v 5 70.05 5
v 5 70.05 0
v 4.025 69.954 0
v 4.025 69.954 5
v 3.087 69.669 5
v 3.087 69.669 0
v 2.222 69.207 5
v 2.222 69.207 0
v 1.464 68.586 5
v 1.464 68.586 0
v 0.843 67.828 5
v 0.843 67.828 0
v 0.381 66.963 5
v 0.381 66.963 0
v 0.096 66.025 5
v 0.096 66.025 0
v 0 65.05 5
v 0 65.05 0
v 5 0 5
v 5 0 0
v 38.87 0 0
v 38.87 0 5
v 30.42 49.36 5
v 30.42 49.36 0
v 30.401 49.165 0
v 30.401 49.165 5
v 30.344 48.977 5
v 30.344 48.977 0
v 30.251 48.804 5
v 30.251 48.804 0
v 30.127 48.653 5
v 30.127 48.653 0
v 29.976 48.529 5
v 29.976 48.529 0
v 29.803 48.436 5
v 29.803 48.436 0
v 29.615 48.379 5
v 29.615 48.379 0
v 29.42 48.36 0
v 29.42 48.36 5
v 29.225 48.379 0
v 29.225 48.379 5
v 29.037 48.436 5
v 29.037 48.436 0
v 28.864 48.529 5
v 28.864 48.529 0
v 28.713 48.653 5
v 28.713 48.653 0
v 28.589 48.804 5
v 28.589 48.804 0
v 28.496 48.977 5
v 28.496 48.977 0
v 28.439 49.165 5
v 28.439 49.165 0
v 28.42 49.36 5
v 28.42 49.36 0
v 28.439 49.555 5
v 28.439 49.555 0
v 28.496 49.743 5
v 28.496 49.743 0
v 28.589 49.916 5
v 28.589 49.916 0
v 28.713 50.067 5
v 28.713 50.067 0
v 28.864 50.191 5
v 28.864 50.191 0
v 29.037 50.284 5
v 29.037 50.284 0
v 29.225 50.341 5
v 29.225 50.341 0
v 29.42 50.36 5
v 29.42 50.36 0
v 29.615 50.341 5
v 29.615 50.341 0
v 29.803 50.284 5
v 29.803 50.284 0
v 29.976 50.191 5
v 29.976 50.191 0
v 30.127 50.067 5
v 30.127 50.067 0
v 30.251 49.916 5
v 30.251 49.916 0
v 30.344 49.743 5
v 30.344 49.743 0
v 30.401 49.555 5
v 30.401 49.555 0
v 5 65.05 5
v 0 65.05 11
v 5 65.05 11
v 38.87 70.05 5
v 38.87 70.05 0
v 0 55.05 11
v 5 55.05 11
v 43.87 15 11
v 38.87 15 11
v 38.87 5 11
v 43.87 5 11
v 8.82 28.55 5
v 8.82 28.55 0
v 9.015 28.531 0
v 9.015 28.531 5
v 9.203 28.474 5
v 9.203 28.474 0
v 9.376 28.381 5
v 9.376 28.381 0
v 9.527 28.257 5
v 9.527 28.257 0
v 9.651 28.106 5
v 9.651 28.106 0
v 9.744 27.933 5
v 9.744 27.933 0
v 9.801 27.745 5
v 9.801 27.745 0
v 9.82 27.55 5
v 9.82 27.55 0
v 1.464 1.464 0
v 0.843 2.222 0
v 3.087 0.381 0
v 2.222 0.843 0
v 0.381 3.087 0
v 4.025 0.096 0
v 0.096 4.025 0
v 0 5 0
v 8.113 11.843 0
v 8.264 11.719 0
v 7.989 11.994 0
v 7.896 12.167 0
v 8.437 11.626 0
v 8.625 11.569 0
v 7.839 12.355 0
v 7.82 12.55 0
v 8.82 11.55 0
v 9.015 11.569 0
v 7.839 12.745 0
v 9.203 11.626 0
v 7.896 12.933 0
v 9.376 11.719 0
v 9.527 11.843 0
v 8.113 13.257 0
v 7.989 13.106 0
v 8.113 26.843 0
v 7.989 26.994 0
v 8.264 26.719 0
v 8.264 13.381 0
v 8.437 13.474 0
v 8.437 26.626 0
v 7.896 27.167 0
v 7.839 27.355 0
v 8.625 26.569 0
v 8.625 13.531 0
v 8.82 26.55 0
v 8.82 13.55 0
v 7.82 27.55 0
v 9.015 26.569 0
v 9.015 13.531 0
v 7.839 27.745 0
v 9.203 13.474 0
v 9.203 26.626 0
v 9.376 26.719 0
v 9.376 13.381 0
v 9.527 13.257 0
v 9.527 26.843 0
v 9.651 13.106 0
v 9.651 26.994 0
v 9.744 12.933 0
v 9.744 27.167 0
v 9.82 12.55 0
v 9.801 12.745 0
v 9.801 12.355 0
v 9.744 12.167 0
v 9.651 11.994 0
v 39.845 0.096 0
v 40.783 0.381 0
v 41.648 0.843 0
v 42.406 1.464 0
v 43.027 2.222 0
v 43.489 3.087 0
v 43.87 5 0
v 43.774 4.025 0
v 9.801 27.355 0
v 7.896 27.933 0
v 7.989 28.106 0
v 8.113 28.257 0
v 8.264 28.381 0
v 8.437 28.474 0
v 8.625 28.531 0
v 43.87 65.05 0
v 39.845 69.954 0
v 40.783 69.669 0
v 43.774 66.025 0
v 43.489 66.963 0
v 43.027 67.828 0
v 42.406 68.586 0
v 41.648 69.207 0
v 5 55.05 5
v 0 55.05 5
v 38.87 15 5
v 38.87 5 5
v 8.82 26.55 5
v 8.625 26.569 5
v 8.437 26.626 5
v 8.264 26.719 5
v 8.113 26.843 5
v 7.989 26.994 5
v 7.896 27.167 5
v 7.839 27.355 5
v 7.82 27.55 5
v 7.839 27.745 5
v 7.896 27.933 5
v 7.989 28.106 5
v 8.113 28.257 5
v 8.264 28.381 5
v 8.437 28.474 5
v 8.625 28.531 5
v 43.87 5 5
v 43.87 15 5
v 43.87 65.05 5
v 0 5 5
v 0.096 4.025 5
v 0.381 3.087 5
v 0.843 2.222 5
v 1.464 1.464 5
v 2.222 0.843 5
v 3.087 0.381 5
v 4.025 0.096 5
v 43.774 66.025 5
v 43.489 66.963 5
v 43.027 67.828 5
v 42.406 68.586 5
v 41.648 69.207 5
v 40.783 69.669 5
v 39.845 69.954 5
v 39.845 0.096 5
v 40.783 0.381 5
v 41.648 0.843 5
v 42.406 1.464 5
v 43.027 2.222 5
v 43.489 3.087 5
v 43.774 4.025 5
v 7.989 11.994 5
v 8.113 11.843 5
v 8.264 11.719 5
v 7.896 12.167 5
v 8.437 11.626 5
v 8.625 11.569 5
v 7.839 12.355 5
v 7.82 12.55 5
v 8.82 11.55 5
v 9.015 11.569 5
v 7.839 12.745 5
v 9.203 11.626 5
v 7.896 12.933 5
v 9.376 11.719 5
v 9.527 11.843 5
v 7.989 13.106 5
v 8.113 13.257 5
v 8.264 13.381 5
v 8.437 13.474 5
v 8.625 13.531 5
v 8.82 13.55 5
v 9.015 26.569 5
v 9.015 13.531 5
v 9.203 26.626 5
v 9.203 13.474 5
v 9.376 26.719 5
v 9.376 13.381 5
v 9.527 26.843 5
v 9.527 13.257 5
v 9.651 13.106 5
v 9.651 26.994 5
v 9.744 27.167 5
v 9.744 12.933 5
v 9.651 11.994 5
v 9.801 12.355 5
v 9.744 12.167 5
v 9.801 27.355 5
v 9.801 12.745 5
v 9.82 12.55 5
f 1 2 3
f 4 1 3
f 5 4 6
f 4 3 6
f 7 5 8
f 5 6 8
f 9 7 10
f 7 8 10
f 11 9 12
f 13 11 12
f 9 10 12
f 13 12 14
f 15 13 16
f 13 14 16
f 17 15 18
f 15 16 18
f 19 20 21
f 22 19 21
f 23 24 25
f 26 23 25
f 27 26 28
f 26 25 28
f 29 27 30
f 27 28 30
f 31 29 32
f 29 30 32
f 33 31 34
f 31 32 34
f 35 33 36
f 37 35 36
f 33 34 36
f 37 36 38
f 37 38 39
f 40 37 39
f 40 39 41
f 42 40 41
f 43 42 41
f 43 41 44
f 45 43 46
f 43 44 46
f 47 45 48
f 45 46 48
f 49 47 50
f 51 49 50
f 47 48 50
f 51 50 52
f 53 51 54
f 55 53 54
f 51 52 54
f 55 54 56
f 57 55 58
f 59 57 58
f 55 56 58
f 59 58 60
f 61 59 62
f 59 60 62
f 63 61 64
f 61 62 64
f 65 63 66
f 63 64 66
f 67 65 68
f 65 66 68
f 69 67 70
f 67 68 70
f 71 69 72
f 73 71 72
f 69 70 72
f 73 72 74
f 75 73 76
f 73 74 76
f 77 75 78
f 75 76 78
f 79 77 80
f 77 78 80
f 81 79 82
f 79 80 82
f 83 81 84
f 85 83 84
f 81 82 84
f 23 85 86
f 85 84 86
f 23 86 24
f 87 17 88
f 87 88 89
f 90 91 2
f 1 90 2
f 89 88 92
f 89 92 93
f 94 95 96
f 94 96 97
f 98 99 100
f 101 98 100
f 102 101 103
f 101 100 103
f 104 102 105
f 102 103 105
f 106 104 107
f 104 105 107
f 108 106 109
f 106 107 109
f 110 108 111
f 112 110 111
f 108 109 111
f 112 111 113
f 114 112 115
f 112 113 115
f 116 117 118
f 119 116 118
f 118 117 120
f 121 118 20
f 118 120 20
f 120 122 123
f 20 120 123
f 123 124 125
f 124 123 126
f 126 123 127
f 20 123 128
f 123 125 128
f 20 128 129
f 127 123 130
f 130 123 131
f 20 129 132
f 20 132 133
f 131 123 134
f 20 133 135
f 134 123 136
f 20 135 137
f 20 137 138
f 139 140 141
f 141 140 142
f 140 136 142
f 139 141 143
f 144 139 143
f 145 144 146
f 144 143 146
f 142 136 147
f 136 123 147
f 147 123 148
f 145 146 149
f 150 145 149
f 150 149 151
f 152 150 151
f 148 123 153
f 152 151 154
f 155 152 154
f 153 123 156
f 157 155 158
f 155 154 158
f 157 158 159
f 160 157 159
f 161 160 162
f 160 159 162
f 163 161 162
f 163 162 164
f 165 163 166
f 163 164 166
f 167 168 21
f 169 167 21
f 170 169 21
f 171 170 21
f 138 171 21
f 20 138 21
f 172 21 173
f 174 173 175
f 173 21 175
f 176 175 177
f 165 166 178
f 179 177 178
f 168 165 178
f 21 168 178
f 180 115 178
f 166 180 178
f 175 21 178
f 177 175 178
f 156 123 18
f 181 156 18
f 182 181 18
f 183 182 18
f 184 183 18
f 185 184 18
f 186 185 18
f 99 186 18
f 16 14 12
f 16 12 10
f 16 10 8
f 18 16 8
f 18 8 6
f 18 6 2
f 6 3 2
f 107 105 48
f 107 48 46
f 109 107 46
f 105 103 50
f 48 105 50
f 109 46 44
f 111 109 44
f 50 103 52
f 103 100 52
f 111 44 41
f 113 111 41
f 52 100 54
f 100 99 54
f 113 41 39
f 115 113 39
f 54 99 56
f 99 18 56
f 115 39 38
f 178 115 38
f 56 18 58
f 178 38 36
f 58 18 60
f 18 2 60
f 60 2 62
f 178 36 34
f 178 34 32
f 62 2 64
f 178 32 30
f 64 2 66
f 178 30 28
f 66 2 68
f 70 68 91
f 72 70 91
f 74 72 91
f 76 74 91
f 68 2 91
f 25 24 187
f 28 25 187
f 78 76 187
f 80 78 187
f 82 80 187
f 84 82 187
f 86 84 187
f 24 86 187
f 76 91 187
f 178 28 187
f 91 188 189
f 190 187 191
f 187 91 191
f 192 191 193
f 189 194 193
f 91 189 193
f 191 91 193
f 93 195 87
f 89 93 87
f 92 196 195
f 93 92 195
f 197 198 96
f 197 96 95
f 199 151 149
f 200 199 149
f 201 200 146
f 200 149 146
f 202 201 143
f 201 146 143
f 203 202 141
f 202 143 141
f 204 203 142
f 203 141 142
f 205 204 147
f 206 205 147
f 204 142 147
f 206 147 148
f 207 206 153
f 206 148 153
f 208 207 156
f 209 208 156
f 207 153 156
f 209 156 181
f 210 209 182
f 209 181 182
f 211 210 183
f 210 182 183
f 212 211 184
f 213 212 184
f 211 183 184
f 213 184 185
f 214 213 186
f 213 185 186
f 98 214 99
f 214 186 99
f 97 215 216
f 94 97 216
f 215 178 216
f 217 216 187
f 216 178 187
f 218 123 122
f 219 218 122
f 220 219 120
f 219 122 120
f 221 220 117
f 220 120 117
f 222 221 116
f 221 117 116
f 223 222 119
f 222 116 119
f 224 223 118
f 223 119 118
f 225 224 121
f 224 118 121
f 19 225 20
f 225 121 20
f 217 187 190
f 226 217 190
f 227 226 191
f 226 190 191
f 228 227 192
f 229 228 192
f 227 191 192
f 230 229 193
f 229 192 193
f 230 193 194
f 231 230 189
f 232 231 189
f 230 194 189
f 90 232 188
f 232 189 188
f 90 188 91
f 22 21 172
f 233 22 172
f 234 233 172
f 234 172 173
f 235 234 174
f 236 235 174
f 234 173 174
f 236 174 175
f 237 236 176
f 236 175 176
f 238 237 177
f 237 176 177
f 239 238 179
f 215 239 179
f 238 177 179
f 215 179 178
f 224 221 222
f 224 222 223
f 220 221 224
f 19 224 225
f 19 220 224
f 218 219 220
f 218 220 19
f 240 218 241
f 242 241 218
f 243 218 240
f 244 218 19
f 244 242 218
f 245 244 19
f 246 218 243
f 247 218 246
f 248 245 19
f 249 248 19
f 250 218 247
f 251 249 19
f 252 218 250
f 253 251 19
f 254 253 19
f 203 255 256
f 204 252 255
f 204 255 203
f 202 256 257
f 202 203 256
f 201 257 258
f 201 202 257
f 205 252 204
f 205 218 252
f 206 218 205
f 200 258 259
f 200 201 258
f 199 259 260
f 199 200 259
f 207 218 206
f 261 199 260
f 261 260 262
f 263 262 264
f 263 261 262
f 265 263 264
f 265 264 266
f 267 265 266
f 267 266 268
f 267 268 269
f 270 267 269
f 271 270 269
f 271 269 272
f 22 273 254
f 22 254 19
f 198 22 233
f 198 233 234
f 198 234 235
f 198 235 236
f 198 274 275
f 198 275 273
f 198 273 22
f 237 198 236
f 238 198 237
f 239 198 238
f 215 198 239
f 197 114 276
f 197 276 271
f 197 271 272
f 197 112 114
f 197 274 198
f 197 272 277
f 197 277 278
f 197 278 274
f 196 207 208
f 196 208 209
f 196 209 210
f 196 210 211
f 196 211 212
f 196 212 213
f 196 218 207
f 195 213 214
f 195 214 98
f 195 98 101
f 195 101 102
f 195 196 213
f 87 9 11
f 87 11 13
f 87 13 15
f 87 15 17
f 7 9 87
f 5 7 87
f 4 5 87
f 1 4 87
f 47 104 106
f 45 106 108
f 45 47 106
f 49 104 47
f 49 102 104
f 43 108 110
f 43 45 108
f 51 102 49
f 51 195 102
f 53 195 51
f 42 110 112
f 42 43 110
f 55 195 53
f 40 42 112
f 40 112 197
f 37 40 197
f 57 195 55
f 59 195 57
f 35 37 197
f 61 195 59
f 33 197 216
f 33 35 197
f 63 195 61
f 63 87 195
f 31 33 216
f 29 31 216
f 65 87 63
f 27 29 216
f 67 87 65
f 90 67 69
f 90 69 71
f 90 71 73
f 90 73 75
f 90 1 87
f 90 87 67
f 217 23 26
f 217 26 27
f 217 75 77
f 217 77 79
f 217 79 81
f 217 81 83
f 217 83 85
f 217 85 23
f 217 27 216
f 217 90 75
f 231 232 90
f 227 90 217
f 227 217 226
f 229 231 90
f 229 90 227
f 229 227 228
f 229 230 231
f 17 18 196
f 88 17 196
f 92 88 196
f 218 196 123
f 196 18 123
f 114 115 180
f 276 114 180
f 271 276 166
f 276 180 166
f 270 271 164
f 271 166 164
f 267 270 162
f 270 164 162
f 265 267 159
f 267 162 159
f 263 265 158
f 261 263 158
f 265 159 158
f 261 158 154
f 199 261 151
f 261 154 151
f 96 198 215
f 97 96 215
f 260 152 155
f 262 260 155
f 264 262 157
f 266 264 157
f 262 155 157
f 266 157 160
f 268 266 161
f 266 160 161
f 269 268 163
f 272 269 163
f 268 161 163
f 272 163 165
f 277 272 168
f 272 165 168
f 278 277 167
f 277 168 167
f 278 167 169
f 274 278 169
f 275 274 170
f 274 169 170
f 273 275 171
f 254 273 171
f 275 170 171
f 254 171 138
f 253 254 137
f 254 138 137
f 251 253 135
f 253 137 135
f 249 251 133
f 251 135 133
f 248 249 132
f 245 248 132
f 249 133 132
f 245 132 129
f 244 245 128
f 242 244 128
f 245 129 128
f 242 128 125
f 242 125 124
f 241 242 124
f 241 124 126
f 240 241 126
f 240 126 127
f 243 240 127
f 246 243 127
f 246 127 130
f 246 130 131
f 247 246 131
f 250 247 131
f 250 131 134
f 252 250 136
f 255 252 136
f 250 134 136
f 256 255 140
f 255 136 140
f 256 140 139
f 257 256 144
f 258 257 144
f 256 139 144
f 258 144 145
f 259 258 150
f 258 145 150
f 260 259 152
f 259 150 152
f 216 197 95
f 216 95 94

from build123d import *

# Parameters (mm, degrees)
F1_DEPTH = 5
F2_W     = 10
F2_H     = 5
F3_DEPTH = 6
F2_W_2   = 5
F2_H_2   = 10


with BuildPart() as f1:
    # F0 (on Top) → F1 (new body)
    with BuildSketch(Plane.XY):
        with BuildLine():
            ThreePointArc((0, 5), (1.4644660941, 1.4644660941), (5, 0))
            Line((5, 0), (38.87, 0))
            ThreePointArc((38.87, 0), (42.4055339059, 1.4644660941), (43.87, 5))
            Line((43.87, 5), (43.87, 49.36))
            Line((43.87, 49.36), (43.87, 65.05))
            ThreePointArc((43.87, 65.05), (42.4055339059, 68.5855339059), (38.87, 70.05))
            Line((38.87, 70.05), (5, 70.05))
            ThreePointArc((5, 70.05), (1.4644660941, 68.5855339059), (0, 65.05))
            Line((0, 65.05), (0, 5))
        make_face()
        with BuildLine():
            ThreePointArc((9.82, 12.55), (8.1128932188, 11.8428932188), (8.82, 13.55))
            ThreePointArc((8.82, 13.55), (9.5271067812, 13.2571067812), (9.82, 12.55))
        make_face(mode=Mode.SUBTRACT)
        with BuildLine():
            ThreePointArc((8.82, 26.55), (7.82, 27.55), (8.82, 28.55))
            ThreePointArc((8.82, 28.55), (9.5271067812, 28.2571067812), (9.82, 27.55))
            ThreePointArc((9.82, 27.55), (9.5271067812, 26.8428932188), (8.82, 26.55))
        make_face(mode=Mode.SUBTRACT)
        with BuildLine():
            ThreePointArc((28.42, 49.36), (29.42, 50.36), (30.42, 49.36))
            ThreePointArc((30.42, 49.36), (29.42, 48.36), (28.42, 49.36))
        make_face(mode=Mode.SUBTRACT)
    extrude(amount=F1_DEPTH)

    # F2 (on face) → F3, piece 2 (join)
    with BuildSketch(Plane.XY.offset(5)):
        with Locations((41.37, 10)):
            Rectangle(F2_W_2, F2_H_2)
        with Locations((2.5, 60.05)):
            Rectangle(F2_W_2, F2_H_2)
    extrude(amount=F3_DEPTH)


with BuildPart() as f3:
    # F2 (on face) → F3 (new body)
    with BuildSketch(Plane.XY.offset(5)):
        with Locations((33.87, 2.5)):
            Rectangle(F2_W, F2_H)
    extrude(amount=F3_DEPTH)


solid = f1.part
